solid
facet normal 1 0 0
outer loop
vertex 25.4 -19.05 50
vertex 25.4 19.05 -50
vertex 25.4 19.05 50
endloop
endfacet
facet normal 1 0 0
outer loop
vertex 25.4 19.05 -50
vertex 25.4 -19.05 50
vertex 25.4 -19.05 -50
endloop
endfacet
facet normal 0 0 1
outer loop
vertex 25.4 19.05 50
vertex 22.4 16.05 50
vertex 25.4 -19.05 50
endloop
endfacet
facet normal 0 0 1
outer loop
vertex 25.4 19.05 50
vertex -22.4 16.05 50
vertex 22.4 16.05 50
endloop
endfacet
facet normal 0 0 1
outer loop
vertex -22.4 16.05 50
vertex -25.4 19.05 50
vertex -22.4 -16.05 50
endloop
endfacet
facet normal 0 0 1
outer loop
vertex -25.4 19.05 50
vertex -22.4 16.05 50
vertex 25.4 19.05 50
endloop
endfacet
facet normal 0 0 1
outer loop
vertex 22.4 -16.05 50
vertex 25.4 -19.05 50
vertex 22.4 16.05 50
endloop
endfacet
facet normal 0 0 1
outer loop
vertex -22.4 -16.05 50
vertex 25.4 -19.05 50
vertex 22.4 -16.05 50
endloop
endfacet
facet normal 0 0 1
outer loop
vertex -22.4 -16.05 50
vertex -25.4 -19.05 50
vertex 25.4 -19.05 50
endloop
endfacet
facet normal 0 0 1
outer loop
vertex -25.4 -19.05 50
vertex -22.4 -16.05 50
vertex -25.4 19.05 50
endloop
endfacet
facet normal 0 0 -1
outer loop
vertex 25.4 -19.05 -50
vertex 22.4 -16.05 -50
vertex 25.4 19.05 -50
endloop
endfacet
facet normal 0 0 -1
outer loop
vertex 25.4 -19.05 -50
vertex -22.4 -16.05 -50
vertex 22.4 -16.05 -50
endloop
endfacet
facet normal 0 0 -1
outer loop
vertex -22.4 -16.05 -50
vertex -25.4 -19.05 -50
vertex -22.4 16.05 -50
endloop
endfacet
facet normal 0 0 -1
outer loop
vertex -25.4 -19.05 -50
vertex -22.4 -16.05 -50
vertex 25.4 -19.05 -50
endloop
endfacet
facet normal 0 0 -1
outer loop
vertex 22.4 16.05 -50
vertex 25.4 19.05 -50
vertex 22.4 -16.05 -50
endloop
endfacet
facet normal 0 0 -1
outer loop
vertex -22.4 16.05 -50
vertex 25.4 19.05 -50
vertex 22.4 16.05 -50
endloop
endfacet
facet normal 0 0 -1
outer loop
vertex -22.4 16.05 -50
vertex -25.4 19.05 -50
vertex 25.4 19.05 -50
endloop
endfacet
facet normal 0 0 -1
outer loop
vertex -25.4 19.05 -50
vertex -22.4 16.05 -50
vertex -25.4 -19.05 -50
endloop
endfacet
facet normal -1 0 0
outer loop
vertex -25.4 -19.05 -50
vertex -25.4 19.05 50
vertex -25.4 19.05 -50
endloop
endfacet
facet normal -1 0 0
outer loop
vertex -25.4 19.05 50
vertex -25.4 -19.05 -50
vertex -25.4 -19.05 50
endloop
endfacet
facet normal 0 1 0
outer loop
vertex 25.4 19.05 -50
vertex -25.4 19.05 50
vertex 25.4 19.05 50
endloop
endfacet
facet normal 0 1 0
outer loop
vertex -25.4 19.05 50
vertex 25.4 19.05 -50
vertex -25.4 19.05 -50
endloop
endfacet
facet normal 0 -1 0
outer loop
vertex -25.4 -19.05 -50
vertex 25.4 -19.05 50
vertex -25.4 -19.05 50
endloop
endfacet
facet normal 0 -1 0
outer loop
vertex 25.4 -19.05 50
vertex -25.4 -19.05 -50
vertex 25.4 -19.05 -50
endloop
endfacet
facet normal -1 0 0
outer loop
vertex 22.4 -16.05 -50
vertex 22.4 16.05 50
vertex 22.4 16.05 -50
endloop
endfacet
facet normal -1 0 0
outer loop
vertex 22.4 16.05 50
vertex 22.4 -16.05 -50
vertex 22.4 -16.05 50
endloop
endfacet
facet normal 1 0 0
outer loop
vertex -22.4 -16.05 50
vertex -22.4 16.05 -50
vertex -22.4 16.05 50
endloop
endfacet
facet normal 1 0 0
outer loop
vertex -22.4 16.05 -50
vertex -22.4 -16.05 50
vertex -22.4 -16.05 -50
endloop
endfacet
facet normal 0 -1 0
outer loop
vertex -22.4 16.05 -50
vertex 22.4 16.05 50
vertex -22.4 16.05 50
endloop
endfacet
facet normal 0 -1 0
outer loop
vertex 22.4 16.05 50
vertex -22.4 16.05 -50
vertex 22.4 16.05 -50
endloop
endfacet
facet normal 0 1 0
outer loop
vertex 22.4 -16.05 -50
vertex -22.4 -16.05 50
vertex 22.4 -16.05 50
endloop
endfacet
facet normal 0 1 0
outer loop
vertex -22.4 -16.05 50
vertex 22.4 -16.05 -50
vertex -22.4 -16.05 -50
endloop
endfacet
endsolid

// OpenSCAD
// Aluminium rectangular box section: 50.8mm x 38.1mm x 3.0mm wall
// Length is along Z. Model is one connected solid (hollow tube via difference).

module rectangular_tube(length=100, outer_w=50.8, outer_h=38.1, t=3.0) {
    eps = 0.05; // small overlap to ensure clean boolean cut-through

    inner_w = outer_w - 2*t;
    inner_h = outer_h - 2*t;

    assert(length > 0, "Length must be > 0.");
    assert(inner_w > 0 && inner_h > 0, "Wall thickness too large for given outer dimensions.");

    difference() {
        cube([outer_w, outer_h, length], center=true);

        // Inner void: slightly longer so it fully cuts through both ends
        cube([inner_w, inner_h, length + 2*eps], center=true);
    }
}

// Example usage
rectangular_tube(length=100, outer_w=50.8, outer_h=38.1, t=3.0);
